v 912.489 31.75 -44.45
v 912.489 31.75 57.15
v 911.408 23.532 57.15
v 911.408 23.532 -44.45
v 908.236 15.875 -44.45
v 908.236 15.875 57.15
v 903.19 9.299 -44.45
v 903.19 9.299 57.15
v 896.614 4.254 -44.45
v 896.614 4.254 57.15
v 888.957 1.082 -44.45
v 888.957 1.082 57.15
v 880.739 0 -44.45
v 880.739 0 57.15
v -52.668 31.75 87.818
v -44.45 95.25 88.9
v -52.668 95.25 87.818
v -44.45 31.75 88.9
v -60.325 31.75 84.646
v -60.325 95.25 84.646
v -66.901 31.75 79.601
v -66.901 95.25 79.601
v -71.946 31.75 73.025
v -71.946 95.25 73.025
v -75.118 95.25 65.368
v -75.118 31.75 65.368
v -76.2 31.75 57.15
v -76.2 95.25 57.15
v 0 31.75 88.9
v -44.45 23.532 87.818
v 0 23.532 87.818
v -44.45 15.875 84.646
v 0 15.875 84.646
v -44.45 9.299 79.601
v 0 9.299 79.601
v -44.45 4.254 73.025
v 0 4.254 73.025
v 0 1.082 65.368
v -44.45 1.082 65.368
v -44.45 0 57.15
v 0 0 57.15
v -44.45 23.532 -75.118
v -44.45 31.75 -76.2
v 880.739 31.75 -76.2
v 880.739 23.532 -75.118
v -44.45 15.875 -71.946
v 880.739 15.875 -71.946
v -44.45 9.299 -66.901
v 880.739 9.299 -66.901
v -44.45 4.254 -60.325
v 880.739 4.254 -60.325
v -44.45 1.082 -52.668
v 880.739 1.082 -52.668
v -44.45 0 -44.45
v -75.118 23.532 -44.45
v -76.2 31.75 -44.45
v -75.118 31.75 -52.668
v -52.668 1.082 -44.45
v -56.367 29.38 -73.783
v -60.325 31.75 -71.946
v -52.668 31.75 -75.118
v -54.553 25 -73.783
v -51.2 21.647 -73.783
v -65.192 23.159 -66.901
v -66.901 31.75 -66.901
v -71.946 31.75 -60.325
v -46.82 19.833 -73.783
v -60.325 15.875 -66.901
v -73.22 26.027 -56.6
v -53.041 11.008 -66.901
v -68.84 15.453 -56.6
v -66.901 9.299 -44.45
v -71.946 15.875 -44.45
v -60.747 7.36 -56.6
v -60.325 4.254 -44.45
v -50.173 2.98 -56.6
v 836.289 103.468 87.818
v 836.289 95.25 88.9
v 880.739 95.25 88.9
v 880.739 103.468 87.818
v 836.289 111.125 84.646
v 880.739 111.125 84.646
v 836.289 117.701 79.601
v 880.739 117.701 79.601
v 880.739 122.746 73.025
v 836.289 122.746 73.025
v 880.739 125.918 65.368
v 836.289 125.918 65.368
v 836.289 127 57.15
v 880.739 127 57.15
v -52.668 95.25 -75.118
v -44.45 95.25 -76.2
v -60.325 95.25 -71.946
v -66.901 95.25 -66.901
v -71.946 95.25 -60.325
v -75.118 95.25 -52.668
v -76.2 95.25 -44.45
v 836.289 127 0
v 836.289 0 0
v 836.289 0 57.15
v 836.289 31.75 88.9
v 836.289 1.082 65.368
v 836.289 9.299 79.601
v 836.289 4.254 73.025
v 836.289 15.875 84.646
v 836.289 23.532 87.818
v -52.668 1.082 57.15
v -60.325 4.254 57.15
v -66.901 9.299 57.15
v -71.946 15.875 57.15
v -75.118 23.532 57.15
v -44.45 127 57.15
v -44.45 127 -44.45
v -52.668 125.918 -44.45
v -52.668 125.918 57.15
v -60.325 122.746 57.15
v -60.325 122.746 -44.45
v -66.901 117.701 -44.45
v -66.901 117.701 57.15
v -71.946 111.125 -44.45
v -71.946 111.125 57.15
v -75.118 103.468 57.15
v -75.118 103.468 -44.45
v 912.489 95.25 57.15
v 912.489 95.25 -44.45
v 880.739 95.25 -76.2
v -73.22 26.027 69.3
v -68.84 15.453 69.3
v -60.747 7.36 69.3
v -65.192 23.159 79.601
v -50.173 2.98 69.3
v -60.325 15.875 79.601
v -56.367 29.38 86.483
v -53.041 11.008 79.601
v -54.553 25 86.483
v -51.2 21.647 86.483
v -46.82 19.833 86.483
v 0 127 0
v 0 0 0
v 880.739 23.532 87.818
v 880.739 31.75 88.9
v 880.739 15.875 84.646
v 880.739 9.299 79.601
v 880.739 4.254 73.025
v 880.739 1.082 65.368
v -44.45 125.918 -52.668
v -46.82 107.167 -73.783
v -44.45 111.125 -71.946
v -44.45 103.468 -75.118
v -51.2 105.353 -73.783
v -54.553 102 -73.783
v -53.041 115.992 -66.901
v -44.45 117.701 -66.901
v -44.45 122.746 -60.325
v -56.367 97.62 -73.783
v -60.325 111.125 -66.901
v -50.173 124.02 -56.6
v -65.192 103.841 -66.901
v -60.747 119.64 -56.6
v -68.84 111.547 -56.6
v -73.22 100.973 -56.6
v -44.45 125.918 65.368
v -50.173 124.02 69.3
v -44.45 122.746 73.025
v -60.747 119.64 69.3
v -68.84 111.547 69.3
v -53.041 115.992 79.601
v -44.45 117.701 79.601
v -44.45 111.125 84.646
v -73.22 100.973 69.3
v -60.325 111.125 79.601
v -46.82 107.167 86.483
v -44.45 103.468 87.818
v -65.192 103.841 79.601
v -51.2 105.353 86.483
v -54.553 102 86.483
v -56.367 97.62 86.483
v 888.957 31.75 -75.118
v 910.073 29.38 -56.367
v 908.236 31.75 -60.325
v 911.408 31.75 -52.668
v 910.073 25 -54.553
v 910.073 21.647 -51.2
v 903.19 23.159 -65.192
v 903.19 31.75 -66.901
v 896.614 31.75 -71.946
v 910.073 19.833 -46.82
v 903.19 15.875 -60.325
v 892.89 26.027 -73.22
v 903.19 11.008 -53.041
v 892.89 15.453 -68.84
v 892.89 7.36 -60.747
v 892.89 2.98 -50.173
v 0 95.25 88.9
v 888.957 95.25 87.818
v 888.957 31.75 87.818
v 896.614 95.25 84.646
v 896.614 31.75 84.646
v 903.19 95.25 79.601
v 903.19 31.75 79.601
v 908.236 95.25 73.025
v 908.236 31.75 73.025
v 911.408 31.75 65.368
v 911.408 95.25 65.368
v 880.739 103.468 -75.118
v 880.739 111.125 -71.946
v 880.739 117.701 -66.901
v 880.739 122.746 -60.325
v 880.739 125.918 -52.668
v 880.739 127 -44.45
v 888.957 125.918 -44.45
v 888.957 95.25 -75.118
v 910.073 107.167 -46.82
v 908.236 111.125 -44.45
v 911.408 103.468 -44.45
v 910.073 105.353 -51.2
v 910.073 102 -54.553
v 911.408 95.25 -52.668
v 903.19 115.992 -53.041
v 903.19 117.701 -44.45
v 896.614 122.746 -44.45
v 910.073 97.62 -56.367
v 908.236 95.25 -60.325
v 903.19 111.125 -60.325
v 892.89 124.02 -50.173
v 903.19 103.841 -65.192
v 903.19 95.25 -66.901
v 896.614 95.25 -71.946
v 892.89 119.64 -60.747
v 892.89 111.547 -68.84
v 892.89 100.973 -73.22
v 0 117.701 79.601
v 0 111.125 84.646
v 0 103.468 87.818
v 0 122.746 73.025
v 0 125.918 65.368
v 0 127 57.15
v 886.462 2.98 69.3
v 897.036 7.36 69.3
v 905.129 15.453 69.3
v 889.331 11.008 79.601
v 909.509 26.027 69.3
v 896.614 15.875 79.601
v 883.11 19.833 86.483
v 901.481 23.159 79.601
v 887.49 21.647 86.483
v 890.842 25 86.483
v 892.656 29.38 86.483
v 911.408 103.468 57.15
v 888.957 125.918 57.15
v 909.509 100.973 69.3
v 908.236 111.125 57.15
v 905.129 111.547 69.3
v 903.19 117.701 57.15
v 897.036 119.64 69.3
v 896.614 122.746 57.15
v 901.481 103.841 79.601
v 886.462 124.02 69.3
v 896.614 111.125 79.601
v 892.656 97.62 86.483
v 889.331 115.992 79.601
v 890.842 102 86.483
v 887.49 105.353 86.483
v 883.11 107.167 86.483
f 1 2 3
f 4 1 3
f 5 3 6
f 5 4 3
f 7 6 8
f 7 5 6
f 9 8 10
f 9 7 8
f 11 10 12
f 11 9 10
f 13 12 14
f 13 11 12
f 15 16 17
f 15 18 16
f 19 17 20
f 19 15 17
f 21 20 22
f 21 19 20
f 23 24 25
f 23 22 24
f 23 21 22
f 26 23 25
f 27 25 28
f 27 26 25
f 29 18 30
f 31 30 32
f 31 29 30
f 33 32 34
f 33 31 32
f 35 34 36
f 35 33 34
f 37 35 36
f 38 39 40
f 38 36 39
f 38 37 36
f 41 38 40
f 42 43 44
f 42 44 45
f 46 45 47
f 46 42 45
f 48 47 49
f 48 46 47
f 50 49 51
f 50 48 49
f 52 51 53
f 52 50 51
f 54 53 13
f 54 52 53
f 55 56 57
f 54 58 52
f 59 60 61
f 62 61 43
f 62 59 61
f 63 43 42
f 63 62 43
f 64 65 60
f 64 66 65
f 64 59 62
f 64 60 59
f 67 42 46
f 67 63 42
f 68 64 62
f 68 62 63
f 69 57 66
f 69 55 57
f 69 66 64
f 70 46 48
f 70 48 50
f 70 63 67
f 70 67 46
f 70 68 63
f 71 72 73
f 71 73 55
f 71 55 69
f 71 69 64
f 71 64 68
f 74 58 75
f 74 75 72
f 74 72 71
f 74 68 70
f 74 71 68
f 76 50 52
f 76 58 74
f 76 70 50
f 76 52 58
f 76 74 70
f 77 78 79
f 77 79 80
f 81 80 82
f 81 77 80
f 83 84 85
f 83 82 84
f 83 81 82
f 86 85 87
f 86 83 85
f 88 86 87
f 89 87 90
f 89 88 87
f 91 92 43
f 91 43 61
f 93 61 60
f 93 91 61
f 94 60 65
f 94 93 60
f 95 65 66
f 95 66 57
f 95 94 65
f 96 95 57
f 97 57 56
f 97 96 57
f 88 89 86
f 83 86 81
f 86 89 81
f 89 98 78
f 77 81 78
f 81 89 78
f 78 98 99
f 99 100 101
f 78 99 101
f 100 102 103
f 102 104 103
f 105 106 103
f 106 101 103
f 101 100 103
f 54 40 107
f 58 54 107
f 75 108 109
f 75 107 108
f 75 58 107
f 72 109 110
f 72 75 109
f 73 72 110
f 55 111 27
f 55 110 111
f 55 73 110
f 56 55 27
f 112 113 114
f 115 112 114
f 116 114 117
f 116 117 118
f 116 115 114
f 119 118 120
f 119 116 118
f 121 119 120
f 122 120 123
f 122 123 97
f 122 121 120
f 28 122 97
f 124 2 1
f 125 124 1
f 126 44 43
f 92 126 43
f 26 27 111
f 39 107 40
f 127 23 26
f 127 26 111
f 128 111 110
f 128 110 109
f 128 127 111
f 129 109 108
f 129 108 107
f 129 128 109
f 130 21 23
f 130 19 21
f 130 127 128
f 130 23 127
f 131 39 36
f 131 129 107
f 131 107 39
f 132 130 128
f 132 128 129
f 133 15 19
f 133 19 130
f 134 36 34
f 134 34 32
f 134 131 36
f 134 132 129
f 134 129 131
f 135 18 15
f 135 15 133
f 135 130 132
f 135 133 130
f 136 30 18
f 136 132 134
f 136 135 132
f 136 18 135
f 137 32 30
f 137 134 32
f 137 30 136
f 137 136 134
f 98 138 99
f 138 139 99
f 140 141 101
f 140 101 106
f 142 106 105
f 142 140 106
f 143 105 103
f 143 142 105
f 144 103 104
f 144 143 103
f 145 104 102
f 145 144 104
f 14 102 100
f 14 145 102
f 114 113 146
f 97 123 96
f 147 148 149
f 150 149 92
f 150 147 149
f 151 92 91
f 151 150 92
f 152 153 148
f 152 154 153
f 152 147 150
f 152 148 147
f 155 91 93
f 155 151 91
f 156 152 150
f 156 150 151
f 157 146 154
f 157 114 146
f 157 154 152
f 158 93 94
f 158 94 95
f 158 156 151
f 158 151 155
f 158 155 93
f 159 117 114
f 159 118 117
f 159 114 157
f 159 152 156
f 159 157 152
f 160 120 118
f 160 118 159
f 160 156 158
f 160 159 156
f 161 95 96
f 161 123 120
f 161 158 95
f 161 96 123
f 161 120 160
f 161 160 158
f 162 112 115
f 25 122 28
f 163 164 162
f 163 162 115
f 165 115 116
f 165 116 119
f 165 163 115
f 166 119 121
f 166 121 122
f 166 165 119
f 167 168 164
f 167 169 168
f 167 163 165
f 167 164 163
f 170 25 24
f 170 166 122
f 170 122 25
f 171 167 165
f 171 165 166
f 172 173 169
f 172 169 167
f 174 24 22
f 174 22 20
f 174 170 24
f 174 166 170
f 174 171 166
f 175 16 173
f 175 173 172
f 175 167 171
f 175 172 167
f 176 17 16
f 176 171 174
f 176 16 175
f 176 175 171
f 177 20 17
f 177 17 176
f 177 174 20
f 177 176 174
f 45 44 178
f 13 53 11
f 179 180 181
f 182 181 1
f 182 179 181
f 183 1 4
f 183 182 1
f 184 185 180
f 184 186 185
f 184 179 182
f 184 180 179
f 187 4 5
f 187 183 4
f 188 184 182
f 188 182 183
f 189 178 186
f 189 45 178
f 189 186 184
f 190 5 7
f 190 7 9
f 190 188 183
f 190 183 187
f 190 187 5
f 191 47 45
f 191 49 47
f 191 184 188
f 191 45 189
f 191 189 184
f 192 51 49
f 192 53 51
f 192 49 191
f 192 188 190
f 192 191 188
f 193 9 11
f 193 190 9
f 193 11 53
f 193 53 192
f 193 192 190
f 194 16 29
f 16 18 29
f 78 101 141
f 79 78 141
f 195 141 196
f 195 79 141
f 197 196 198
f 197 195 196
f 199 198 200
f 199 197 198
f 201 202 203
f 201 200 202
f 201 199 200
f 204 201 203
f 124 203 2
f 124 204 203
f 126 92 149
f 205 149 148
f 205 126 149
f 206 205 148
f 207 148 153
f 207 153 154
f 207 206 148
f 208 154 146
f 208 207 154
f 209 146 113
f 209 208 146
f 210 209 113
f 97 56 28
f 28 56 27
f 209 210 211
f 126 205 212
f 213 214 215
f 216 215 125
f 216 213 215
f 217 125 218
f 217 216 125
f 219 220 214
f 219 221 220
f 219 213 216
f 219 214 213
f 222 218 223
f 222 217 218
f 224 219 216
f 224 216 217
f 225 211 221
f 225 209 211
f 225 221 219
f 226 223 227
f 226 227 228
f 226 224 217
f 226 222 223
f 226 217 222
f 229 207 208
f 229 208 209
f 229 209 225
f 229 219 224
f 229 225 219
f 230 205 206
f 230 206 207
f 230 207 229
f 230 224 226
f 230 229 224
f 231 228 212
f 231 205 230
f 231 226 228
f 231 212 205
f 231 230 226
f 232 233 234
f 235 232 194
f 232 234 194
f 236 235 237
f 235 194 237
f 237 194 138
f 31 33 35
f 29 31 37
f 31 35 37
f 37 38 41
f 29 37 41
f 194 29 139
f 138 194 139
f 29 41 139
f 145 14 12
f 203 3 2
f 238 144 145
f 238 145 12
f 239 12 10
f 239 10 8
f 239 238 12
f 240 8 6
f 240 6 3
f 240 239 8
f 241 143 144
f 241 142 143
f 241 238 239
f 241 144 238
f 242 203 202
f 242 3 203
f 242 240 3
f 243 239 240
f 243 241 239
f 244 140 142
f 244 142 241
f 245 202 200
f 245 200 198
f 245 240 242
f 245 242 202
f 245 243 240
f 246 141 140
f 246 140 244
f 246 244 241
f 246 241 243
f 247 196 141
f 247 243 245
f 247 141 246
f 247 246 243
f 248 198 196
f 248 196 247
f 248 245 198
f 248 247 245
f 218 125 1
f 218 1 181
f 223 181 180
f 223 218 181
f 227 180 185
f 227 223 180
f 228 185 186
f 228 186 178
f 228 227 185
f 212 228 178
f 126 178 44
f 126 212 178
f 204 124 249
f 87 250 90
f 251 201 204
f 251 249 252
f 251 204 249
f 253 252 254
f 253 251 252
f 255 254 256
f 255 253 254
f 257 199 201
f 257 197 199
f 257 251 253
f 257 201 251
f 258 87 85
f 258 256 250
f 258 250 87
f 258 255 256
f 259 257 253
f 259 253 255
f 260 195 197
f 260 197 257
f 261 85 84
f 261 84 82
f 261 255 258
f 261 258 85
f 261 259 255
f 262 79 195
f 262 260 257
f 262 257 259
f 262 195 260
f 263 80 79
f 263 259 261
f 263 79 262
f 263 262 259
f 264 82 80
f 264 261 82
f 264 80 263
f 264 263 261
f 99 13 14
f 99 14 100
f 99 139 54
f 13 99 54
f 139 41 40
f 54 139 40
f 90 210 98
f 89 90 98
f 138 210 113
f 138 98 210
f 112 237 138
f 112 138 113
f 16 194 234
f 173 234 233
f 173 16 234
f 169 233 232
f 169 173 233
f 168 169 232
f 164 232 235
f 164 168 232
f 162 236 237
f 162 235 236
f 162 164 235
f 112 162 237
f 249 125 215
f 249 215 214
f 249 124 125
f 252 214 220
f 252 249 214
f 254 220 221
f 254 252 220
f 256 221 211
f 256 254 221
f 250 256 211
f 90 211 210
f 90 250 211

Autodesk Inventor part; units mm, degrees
ref_plane "YZ Plane" through (0, 0, 0) normal (1, 0, 0) x (0, 1, 0)
ref_plane "XZ Plane" through (0, 0, 0) normal (0, 1, 0) x (-1, 0, 0)
ref_plane "XY Plane" through (0, 0, 0) normal (0, 0, 1) x (1, 0, 0)
sketch "Sketch1" plane through (0, 0, 0) normal (0, 1, 0) x (-1, 0, 0)
  line L0 (0, 0) -> (-418.1447, 0)
  line L1 (-418.1447, 0) -> (-418.1447, -76.2)
  line L2 (-418.1447, -76.2) -> (0, -76.2)
  line L3 (0, -76.2) -> (0, 0)
  line L4 (0, -76.2) -> (76.2, -76.2)
  line L5 (76.2, -76.2) -> (76.2, 0)
  line L6 (76.2, 0) -> (0, 0)
  line L7 (0, 0) -> (0, -76.2)
  line L8 (0, 0) -> (76.2, 0)
  line L9 (76.2, 0) -> (76.2, 88.9)
  line L10 (76.2, 88.9) -> (0, 88.9)
  line L11 (0, 88.9) -> (0, 0)
  dimension "d0" = 418.1447
  dimension "d1" = 76.2
  dimension "d4" = 76.2
  dimension "d5" = 76.2
  dimension "d6" = 76.2
  dimension "d7" = 88.9
extrude "Extrusion2" add sketch "Sketch1" along normal blind 127
mirror "Mirror1" about plane through (418.1447, 0, 0) normal (1, 0, 0) of "Extrusion2"
fillet "Fillet1" radius 31.75 8 edges at (-76.2, 127, 6.35) (-76.2, 0, 6.35) (418.1447, 127, -76.2) (418.1447, 0, -76.2) (-76.2, 63.5, -76.2) (912.4895, 63.5, -76.2) (912.4895, 127, 6.35) (912.4895, 0, 6.35)
fillet "Fillet2" radius 31.75 5 edges at (912.4895, 63.5, 88.9) (903.1901, 9.2994, 88.9) (858.5145, 0, 88.9) (858.5145, 127, 88.9) (903.1901, 117.7006, 88.9)
fillet "Fillet3" radius 31.75 5 edges at (-66.9006, 117.7006, 88.9) (-76.2, 63.5, 88.9) (-66.9006, 9.2994, 88.9) (-22.225, 0, 88.9) (-22.225, 127, 88.9)
sketch "Sketch3" plane through (880.7395, 31.75, -76.2) normal (0, 0, -1) x (-1, 0, 0)
  line L0 (314.0818, 85.8231) -> (611.0931, 85.8231) construction
  line L1 (611.0931, 85.8231) -> (611.0931, -17.1741) construction
  line L2 (611.0931, -17.1741) -> (314.0818, -17.1741) construction
  line L3 (314.0818, -17.1741) -> (314.0818, 85.8231) construction
  line L4 (925.1895, 63.5) -> (925.1895, 0) projected
  line L5 (0, 0) -> (0, 63.5) projected
  point P0 (880.7395, -31.75)
  dimension "d31" = 314.0964
decal "Decal1"
properties part number "Bumper" material "CFRP"
